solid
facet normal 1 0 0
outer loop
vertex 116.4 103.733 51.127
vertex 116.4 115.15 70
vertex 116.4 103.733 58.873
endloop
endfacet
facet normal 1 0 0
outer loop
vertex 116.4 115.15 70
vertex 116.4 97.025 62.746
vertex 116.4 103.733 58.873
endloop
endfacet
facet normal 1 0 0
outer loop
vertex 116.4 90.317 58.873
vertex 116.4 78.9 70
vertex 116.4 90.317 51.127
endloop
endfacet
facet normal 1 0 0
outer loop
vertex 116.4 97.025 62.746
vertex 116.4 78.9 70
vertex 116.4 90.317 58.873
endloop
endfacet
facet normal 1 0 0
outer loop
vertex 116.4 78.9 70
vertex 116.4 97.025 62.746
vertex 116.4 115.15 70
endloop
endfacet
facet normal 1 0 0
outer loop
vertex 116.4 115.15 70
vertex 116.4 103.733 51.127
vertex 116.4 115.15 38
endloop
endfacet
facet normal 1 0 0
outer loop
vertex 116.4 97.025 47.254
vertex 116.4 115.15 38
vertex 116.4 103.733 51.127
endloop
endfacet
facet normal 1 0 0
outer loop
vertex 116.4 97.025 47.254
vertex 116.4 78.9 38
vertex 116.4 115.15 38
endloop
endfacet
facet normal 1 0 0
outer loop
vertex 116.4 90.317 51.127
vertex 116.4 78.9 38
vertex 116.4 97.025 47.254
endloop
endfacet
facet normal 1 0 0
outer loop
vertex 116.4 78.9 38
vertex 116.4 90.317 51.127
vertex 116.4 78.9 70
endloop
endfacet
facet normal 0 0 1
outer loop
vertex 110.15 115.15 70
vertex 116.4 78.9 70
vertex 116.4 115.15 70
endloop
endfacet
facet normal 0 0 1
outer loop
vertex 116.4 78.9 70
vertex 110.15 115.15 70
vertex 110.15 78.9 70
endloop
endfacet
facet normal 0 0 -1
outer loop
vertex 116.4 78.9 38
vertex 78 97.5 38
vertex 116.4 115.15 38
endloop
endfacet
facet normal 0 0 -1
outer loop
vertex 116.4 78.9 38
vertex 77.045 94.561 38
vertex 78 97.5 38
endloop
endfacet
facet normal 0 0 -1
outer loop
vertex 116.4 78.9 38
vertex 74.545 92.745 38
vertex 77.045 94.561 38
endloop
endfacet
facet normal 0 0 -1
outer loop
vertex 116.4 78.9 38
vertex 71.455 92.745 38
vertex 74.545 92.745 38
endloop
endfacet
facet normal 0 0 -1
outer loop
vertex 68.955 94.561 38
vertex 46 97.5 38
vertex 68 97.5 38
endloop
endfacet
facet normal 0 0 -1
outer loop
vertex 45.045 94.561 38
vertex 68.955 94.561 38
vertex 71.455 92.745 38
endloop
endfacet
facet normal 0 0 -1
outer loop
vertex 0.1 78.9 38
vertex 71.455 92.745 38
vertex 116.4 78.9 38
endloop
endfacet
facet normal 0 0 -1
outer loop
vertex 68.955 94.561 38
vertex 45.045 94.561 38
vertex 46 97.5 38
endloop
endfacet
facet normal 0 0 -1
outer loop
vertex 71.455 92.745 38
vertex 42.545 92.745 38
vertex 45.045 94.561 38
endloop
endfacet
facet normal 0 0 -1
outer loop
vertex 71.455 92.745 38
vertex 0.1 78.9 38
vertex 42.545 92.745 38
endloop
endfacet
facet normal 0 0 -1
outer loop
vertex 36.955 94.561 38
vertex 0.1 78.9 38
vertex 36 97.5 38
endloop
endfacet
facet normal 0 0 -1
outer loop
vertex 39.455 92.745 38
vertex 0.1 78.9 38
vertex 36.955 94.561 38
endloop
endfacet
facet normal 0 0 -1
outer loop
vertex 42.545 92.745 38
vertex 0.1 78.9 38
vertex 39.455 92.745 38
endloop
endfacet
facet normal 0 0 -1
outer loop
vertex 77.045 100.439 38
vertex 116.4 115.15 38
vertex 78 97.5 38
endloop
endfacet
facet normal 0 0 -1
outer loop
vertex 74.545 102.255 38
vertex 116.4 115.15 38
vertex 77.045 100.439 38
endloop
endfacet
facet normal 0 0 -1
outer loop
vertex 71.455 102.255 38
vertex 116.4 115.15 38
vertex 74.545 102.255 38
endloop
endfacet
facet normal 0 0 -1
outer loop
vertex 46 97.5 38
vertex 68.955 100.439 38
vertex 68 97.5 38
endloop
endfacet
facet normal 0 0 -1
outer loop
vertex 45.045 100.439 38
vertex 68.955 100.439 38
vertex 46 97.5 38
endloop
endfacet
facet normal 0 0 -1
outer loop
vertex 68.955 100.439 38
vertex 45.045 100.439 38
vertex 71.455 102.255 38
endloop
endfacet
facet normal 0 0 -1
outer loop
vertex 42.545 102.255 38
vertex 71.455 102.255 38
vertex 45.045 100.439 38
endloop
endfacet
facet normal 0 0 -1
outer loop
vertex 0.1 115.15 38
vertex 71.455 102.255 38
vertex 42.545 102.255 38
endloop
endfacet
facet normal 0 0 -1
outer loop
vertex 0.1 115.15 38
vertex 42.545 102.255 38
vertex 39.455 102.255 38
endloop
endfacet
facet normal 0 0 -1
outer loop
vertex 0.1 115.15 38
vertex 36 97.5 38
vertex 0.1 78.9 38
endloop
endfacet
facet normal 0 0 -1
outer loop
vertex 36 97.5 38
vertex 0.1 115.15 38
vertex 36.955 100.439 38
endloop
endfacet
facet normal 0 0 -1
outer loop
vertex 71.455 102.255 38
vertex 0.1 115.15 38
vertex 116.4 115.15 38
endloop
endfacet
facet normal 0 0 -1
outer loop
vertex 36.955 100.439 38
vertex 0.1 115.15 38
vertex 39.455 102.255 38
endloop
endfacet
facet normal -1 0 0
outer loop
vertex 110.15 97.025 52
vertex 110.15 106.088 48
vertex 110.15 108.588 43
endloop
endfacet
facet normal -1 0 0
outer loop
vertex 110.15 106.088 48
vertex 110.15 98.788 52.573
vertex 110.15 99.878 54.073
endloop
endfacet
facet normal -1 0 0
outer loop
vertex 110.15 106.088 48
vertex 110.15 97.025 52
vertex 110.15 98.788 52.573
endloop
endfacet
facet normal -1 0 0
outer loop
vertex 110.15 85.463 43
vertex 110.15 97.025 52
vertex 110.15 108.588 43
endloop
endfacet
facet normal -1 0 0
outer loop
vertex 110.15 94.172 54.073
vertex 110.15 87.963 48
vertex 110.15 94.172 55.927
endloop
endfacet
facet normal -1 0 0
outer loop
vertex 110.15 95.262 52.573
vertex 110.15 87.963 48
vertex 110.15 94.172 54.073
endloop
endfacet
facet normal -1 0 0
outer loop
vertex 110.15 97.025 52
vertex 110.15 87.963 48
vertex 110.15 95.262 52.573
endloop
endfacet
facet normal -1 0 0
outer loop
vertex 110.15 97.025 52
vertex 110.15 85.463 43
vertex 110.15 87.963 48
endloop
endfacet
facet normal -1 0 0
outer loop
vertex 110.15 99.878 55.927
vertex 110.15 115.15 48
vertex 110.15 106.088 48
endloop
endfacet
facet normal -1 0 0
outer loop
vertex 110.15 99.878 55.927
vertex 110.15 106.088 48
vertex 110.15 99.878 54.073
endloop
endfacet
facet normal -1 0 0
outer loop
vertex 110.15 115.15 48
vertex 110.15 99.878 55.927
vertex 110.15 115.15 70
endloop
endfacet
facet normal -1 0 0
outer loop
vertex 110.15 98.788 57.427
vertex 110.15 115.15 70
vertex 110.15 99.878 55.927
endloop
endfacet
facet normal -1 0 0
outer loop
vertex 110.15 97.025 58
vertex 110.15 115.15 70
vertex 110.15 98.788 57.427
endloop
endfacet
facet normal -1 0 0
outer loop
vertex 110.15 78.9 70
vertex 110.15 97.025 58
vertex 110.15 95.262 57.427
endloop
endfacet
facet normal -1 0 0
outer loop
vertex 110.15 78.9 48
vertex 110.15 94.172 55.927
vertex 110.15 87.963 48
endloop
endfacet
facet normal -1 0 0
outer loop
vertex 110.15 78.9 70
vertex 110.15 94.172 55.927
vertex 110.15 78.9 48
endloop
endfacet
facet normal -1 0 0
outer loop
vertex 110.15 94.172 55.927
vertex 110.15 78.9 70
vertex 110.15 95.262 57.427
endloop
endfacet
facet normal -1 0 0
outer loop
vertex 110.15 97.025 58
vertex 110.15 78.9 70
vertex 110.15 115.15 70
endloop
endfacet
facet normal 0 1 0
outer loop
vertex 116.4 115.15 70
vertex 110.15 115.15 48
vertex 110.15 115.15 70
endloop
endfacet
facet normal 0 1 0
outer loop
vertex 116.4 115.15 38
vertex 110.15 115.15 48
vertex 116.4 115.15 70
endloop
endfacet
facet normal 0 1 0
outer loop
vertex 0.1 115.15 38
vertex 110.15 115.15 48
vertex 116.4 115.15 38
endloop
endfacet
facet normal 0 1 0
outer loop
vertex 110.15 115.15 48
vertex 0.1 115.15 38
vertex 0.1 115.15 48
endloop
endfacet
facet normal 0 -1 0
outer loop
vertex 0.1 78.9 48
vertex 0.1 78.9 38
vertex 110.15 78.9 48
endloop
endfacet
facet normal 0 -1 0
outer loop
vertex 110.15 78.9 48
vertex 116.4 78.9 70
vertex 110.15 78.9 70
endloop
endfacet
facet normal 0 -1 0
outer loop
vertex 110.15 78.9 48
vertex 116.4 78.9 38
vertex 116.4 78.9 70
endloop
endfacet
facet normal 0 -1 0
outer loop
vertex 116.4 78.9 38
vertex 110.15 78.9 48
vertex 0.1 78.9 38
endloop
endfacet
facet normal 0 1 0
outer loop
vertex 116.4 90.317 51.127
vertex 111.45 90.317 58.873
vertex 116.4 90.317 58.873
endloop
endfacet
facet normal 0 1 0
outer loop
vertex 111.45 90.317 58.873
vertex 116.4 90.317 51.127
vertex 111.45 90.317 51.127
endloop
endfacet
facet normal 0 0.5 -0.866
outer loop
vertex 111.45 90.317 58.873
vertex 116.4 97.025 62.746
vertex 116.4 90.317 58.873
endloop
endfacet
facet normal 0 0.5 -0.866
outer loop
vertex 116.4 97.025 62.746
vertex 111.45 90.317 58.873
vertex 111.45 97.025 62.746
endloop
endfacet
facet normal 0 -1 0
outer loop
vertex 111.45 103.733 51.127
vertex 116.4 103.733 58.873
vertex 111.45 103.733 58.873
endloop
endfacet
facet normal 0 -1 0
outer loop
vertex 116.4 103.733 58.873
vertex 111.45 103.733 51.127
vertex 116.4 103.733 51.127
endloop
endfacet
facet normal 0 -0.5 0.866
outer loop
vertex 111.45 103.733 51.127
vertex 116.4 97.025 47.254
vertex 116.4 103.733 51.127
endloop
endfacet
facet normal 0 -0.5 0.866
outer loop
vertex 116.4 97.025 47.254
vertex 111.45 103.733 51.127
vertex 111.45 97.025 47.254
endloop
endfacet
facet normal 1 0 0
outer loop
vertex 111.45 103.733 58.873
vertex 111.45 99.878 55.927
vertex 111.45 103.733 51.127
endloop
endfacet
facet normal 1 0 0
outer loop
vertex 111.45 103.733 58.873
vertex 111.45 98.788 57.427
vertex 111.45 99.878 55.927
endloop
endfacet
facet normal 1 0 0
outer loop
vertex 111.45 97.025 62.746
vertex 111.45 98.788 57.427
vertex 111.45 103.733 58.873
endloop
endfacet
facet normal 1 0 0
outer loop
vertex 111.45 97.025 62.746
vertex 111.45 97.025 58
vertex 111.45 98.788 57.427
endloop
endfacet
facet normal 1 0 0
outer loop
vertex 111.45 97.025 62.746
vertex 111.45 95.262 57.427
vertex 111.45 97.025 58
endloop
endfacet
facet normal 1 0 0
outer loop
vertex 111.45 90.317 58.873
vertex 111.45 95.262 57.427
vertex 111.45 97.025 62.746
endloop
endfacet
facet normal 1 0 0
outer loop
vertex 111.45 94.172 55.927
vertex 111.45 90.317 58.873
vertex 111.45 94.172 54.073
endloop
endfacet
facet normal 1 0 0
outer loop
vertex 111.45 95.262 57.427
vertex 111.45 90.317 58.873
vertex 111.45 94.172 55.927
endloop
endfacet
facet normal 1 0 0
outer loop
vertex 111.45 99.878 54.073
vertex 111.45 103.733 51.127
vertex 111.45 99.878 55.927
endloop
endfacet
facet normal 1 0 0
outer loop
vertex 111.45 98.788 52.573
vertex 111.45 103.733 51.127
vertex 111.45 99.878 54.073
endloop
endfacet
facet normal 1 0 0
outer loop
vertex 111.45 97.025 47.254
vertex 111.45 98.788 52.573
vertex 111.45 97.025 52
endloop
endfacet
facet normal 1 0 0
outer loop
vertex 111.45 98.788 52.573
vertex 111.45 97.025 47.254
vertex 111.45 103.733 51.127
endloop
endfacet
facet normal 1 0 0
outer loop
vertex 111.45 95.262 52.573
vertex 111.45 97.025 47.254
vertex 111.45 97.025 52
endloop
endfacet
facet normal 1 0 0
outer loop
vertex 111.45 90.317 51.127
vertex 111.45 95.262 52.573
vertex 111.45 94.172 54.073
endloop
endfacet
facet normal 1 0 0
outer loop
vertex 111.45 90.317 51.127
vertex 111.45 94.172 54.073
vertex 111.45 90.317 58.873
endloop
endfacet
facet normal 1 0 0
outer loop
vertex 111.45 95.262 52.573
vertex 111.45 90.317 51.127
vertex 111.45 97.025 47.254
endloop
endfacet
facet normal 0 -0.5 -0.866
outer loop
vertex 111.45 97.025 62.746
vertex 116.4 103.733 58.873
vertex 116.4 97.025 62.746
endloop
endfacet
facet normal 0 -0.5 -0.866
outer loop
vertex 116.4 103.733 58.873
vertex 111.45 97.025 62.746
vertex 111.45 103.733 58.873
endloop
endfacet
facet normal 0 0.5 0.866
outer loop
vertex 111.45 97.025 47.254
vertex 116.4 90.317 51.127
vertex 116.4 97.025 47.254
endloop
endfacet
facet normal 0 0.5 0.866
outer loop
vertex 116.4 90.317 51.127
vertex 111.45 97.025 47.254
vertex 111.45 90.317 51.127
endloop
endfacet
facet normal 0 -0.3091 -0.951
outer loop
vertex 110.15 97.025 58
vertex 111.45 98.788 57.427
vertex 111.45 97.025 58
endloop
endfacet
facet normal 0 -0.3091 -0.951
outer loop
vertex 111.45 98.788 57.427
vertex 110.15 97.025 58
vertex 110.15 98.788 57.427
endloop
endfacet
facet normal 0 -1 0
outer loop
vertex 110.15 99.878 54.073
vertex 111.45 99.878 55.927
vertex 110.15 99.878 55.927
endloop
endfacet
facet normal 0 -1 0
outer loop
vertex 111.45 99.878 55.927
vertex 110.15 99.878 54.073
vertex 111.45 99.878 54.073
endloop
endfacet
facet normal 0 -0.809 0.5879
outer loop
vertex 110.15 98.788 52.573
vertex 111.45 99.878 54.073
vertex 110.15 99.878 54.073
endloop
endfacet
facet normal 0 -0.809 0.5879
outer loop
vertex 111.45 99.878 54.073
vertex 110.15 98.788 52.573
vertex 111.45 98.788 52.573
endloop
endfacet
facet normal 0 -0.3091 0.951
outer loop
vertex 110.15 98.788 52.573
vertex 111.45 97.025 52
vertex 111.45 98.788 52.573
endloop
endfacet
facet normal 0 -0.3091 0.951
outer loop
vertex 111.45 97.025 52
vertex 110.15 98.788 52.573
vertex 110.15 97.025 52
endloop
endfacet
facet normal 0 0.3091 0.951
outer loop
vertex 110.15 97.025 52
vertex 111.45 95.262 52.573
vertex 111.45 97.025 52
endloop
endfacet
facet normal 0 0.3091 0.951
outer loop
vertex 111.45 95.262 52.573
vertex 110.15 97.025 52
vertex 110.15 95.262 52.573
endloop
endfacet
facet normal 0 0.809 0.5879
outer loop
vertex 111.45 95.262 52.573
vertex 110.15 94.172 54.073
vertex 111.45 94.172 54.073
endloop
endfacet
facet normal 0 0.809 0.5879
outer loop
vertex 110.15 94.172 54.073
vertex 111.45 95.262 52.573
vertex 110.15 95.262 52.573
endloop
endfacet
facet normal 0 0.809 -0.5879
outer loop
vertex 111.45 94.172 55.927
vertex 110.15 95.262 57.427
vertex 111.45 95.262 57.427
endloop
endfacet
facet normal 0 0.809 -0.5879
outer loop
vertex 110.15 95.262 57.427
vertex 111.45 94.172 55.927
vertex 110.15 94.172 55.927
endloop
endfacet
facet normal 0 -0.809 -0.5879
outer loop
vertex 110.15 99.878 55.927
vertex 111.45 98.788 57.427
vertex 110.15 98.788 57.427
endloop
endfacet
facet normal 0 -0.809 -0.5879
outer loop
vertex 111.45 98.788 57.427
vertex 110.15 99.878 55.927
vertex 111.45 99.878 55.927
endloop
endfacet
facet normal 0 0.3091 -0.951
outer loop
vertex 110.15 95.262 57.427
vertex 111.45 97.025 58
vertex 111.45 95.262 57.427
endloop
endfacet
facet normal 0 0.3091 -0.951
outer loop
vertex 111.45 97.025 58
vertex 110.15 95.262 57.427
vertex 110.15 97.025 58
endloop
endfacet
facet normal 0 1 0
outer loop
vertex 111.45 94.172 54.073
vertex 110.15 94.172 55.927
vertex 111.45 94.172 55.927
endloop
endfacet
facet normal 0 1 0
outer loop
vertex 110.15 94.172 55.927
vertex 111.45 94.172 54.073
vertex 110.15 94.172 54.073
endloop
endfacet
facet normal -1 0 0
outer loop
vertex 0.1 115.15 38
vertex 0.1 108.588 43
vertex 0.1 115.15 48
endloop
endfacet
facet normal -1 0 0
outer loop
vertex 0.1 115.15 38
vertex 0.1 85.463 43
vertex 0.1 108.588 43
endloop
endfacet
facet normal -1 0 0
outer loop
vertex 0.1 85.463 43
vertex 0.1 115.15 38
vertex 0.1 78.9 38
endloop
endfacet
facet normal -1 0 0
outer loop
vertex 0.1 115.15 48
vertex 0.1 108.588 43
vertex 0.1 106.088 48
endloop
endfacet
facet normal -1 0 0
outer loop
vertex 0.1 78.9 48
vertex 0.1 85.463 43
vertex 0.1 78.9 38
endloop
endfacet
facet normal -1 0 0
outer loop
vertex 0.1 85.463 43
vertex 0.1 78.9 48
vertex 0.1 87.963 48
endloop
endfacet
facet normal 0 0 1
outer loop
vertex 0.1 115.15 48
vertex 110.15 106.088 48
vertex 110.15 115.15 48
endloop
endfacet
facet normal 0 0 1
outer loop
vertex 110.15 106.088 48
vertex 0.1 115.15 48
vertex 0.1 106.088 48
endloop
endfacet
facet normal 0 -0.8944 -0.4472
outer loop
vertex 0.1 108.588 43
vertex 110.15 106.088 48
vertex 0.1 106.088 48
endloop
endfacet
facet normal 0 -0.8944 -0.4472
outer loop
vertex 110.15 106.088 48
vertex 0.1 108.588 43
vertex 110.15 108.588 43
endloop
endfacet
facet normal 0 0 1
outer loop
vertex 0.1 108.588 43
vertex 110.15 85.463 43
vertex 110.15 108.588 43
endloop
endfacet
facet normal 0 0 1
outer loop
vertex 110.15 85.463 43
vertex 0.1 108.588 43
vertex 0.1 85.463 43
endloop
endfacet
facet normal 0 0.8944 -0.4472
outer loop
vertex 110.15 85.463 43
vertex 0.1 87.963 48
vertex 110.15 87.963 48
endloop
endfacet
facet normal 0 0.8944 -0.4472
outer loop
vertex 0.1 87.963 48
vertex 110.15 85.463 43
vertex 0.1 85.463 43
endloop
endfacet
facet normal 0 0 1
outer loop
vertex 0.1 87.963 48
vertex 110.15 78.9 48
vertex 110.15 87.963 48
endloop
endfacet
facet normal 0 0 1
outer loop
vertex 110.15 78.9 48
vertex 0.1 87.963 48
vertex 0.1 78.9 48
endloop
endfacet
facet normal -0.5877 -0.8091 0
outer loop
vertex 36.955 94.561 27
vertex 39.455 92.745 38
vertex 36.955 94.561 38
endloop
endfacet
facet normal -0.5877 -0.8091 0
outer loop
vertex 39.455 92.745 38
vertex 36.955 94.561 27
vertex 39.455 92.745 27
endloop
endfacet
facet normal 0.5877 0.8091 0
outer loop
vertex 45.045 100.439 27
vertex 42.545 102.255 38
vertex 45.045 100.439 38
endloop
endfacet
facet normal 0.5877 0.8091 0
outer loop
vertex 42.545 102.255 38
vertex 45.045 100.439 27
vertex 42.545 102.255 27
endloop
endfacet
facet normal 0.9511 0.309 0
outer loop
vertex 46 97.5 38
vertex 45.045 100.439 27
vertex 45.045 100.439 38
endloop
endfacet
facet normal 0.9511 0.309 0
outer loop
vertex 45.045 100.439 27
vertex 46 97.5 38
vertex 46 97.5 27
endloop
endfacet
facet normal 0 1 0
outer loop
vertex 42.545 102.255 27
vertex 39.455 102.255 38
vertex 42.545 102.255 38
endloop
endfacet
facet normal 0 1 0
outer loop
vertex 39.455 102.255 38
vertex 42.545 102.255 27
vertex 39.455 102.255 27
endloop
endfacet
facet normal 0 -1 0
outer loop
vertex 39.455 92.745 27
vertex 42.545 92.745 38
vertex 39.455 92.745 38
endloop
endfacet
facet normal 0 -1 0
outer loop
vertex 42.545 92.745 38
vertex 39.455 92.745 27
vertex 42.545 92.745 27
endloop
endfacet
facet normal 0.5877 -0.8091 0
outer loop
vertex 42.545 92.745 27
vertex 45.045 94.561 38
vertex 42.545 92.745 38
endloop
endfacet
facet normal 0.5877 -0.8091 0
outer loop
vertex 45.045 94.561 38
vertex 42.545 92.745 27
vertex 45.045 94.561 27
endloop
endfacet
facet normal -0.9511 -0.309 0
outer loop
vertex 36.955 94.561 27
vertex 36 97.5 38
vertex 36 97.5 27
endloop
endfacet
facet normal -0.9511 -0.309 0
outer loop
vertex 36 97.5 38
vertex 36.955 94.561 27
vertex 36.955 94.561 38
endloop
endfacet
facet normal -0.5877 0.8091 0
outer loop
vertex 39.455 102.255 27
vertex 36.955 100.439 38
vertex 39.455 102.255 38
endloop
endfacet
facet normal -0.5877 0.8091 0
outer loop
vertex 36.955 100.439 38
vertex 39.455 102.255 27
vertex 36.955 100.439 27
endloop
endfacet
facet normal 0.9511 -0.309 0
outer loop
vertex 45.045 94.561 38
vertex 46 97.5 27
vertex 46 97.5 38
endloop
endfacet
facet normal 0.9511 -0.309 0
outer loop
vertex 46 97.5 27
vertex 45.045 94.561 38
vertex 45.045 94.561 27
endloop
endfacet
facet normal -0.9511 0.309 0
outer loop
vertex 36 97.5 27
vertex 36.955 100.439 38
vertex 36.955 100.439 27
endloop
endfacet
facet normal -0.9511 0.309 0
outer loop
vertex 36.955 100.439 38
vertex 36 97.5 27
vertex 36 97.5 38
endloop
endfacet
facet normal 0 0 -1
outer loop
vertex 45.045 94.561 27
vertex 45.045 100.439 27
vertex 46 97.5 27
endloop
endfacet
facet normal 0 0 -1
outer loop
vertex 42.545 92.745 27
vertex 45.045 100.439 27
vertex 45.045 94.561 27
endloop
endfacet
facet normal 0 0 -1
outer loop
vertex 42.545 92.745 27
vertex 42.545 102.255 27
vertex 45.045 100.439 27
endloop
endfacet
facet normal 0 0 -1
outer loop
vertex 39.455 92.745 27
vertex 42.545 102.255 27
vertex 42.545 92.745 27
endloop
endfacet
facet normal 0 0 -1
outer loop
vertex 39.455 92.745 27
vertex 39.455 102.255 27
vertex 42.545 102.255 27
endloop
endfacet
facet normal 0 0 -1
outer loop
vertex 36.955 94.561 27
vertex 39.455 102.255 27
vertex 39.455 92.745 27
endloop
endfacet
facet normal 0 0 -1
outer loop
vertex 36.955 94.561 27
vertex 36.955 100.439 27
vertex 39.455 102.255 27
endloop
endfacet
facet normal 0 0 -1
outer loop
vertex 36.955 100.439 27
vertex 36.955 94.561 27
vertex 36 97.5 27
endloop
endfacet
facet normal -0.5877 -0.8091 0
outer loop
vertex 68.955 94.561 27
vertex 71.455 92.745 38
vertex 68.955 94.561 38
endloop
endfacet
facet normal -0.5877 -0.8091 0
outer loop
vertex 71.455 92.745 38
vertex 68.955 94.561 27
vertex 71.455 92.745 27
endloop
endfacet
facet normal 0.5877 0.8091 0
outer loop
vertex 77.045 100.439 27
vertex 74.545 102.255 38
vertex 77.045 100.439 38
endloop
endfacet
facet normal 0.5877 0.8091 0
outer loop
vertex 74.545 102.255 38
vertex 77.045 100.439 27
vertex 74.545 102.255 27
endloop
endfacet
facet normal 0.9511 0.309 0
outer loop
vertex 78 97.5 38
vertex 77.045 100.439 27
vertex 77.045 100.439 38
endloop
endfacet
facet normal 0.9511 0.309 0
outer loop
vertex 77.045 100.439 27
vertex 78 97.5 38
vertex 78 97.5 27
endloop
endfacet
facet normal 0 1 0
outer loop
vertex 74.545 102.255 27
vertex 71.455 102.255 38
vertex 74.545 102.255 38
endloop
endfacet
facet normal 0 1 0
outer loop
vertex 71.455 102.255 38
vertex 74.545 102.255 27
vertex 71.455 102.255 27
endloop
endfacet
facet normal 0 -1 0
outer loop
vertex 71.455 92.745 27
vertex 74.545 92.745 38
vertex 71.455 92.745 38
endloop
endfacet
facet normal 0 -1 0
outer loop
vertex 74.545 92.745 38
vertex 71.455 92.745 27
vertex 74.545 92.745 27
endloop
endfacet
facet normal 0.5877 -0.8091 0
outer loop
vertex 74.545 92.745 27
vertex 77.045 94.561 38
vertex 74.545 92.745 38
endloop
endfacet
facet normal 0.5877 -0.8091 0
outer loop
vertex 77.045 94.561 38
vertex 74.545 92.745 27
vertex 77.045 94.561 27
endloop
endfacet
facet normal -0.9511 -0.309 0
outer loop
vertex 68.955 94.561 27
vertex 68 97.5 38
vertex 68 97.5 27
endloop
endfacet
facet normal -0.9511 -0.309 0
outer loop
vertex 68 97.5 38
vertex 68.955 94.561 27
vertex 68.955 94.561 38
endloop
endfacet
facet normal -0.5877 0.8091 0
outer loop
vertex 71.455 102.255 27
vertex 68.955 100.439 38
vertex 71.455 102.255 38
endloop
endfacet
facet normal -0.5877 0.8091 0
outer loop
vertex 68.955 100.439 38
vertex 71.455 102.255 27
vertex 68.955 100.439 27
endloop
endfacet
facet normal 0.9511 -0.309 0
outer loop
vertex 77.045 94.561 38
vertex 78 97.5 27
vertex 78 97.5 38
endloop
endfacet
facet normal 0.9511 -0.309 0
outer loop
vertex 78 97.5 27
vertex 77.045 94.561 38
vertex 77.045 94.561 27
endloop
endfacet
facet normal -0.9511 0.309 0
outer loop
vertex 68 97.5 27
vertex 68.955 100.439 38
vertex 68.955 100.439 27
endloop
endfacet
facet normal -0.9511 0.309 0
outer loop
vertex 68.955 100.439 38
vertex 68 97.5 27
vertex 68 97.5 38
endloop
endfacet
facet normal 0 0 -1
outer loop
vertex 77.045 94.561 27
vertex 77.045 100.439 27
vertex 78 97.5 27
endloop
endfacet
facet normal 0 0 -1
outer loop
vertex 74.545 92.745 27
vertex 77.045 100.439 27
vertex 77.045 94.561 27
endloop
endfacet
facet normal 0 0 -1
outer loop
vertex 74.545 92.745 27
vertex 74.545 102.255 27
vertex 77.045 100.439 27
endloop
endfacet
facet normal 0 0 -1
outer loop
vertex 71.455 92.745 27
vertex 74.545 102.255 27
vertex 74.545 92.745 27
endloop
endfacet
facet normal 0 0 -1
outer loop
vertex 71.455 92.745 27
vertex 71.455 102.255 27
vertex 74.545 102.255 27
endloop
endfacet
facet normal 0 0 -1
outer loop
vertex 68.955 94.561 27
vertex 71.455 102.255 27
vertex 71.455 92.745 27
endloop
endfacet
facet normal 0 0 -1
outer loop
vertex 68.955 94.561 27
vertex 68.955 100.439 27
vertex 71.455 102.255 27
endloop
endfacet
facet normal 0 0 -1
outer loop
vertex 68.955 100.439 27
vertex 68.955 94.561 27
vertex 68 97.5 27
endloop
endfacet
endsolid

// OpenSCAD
//-----Rabo de Andorinha Cima (Eixo Y) / Rabo de Andorinha Baixo (Eixo X)-----//

//-----Declaração de Variáveis-----//
r=3;
d=25;
h=9;
nx=5;
ny=5;
geo=1;
res=10;
aux=2*d+15.15;
aux2=40.7-24.2+111.70-16.7-5.15/2;
aux3=11/2;
aux4=(37.55+4)/2 - (16.35+5.1/2-13.2);
cc=25;
ff=37.5;
gg=0.2;
shift=(17.5+2*d)/2;
shift2=(17.5)/2;
h_alt=11/2;
hip=h_alt/(sin(60));
o_ext=d*0.75+2*shift; // Segundo rabo de andorinha
o_ext2=2*shift2+d*0.75; //Primeiro rabo de andorinha

//-----Declaração de Funções-----//
module funcao_2d_array_cilindros(r,d,h,nx,ny,geo,res){
    //-----FUNÇÃO ARRAY 2D DE CILÍNDROS-----//
    /*
    Forneça:
        raio dos cilíndros: r
        distância entre os centros de cada cilíndro: d
        altura dos cilíndros: h
        quantidade de cilíndros em ambas as direções: nx, ny
        resolução dos cilíndros: res
    Selecione a geometria:
         Retangular: 1
         Hexagonal: 2
    
    Quantidade de cilíndros = nx*ny
    geo=1 => Dimensões: [(nx-1)*d+2*r,(ny-1)*d+2*r,h]
    geo=2 => Dimensões: [(nx-1+cos(60))*d+2*r,(ny-1)*d*sin(60)+2*r,h]
    */
    if (d<2*r){
        text("Error!");
        translate([0,-15,0])text("Verify your specified dimensions.");
    }else{
        if(geo==1){
            for(j=[0:1:ny-1]){
                for(i=[0:1:nx-1]){
                    translate([i*d,j*d,0])cylinder(h,r,r,$fn=res);
                }
            }
        }else if(geo==2){
            for(j=[0:1:ny-1]){
                for(i=[0:1:nx-1]){
                    translate([i*d+(j%2)*d*cos(60),j*d*sin(60),0])cylinder(h,r,r,$fn=res);
                }
            }
        }else{
            text("Error!");
            translate([0,-15,0])text("Please, choose a valid geometry number.");
        }
        
    }    
}

//-----Rabo de Andorinha (Eixo X)-----//
difference(){
    translate([-(aux/2-shift-(d*0.75)/2)+4-(4*d+5.15+10-o_ext)/2,4*d+5.15+10-o_ext2,0])
    translate([0,0,38])
    rotate([0,0,90])
    rotate([90,0,0]) // Muitas translações e rotações
    {   
        //-----Rabo de Andorinha Baixo (Eixo X)-----// 
        translate([-(15-shift2+(20-(d*0.75))/2),-30,0])linear_extrude(4*d+5.15+10)polygon(points=[[15-shift2+(20-(d*0.75))/2,30],[        35+shift2-(20-(d*0.75))/2,30],[35+        shift2-(20-(d*0.75))/2,40],[27.5+shift2*0.75,40],[30+shift2*0.75,35],[20-shift2*        0.75,35],[22.5-shift2*0.75,40],[15-shift2+(20-(d*0.75))/2,40]]);
    };
};

hex_enc=(12.55/2)/(cos(30));
//-----Fuso/Rosca do Rabo de Andorinha (Eixo X)-----//
difference(){
    translate([4*d+0.15+10,4*d+5.15+10-o_ext2,38])cube([d*0.25,o_ext2,28+4]);
    #translate([4*d+5.15+10+1.3,4*d+5.15+10-o_ext2/2,38+12+5])rotate([0,-90,0])cylinder(5,hex_enc+0.5,hex_enc+0.5,$fn=6);
    #translate([4*d+5.15+10+1.3,4*d+5.15+10-o_ext2/2,38+12+5])rotate([0,-90,0])cylinder(d*0.75,r,r,$fn=res);
};

translate([41,97.5,30-3])cylinder(12+4,5,5,$fn=res);
translate([41+32,97.5,30-3])cylinder(12,5,5,$fn=res);
